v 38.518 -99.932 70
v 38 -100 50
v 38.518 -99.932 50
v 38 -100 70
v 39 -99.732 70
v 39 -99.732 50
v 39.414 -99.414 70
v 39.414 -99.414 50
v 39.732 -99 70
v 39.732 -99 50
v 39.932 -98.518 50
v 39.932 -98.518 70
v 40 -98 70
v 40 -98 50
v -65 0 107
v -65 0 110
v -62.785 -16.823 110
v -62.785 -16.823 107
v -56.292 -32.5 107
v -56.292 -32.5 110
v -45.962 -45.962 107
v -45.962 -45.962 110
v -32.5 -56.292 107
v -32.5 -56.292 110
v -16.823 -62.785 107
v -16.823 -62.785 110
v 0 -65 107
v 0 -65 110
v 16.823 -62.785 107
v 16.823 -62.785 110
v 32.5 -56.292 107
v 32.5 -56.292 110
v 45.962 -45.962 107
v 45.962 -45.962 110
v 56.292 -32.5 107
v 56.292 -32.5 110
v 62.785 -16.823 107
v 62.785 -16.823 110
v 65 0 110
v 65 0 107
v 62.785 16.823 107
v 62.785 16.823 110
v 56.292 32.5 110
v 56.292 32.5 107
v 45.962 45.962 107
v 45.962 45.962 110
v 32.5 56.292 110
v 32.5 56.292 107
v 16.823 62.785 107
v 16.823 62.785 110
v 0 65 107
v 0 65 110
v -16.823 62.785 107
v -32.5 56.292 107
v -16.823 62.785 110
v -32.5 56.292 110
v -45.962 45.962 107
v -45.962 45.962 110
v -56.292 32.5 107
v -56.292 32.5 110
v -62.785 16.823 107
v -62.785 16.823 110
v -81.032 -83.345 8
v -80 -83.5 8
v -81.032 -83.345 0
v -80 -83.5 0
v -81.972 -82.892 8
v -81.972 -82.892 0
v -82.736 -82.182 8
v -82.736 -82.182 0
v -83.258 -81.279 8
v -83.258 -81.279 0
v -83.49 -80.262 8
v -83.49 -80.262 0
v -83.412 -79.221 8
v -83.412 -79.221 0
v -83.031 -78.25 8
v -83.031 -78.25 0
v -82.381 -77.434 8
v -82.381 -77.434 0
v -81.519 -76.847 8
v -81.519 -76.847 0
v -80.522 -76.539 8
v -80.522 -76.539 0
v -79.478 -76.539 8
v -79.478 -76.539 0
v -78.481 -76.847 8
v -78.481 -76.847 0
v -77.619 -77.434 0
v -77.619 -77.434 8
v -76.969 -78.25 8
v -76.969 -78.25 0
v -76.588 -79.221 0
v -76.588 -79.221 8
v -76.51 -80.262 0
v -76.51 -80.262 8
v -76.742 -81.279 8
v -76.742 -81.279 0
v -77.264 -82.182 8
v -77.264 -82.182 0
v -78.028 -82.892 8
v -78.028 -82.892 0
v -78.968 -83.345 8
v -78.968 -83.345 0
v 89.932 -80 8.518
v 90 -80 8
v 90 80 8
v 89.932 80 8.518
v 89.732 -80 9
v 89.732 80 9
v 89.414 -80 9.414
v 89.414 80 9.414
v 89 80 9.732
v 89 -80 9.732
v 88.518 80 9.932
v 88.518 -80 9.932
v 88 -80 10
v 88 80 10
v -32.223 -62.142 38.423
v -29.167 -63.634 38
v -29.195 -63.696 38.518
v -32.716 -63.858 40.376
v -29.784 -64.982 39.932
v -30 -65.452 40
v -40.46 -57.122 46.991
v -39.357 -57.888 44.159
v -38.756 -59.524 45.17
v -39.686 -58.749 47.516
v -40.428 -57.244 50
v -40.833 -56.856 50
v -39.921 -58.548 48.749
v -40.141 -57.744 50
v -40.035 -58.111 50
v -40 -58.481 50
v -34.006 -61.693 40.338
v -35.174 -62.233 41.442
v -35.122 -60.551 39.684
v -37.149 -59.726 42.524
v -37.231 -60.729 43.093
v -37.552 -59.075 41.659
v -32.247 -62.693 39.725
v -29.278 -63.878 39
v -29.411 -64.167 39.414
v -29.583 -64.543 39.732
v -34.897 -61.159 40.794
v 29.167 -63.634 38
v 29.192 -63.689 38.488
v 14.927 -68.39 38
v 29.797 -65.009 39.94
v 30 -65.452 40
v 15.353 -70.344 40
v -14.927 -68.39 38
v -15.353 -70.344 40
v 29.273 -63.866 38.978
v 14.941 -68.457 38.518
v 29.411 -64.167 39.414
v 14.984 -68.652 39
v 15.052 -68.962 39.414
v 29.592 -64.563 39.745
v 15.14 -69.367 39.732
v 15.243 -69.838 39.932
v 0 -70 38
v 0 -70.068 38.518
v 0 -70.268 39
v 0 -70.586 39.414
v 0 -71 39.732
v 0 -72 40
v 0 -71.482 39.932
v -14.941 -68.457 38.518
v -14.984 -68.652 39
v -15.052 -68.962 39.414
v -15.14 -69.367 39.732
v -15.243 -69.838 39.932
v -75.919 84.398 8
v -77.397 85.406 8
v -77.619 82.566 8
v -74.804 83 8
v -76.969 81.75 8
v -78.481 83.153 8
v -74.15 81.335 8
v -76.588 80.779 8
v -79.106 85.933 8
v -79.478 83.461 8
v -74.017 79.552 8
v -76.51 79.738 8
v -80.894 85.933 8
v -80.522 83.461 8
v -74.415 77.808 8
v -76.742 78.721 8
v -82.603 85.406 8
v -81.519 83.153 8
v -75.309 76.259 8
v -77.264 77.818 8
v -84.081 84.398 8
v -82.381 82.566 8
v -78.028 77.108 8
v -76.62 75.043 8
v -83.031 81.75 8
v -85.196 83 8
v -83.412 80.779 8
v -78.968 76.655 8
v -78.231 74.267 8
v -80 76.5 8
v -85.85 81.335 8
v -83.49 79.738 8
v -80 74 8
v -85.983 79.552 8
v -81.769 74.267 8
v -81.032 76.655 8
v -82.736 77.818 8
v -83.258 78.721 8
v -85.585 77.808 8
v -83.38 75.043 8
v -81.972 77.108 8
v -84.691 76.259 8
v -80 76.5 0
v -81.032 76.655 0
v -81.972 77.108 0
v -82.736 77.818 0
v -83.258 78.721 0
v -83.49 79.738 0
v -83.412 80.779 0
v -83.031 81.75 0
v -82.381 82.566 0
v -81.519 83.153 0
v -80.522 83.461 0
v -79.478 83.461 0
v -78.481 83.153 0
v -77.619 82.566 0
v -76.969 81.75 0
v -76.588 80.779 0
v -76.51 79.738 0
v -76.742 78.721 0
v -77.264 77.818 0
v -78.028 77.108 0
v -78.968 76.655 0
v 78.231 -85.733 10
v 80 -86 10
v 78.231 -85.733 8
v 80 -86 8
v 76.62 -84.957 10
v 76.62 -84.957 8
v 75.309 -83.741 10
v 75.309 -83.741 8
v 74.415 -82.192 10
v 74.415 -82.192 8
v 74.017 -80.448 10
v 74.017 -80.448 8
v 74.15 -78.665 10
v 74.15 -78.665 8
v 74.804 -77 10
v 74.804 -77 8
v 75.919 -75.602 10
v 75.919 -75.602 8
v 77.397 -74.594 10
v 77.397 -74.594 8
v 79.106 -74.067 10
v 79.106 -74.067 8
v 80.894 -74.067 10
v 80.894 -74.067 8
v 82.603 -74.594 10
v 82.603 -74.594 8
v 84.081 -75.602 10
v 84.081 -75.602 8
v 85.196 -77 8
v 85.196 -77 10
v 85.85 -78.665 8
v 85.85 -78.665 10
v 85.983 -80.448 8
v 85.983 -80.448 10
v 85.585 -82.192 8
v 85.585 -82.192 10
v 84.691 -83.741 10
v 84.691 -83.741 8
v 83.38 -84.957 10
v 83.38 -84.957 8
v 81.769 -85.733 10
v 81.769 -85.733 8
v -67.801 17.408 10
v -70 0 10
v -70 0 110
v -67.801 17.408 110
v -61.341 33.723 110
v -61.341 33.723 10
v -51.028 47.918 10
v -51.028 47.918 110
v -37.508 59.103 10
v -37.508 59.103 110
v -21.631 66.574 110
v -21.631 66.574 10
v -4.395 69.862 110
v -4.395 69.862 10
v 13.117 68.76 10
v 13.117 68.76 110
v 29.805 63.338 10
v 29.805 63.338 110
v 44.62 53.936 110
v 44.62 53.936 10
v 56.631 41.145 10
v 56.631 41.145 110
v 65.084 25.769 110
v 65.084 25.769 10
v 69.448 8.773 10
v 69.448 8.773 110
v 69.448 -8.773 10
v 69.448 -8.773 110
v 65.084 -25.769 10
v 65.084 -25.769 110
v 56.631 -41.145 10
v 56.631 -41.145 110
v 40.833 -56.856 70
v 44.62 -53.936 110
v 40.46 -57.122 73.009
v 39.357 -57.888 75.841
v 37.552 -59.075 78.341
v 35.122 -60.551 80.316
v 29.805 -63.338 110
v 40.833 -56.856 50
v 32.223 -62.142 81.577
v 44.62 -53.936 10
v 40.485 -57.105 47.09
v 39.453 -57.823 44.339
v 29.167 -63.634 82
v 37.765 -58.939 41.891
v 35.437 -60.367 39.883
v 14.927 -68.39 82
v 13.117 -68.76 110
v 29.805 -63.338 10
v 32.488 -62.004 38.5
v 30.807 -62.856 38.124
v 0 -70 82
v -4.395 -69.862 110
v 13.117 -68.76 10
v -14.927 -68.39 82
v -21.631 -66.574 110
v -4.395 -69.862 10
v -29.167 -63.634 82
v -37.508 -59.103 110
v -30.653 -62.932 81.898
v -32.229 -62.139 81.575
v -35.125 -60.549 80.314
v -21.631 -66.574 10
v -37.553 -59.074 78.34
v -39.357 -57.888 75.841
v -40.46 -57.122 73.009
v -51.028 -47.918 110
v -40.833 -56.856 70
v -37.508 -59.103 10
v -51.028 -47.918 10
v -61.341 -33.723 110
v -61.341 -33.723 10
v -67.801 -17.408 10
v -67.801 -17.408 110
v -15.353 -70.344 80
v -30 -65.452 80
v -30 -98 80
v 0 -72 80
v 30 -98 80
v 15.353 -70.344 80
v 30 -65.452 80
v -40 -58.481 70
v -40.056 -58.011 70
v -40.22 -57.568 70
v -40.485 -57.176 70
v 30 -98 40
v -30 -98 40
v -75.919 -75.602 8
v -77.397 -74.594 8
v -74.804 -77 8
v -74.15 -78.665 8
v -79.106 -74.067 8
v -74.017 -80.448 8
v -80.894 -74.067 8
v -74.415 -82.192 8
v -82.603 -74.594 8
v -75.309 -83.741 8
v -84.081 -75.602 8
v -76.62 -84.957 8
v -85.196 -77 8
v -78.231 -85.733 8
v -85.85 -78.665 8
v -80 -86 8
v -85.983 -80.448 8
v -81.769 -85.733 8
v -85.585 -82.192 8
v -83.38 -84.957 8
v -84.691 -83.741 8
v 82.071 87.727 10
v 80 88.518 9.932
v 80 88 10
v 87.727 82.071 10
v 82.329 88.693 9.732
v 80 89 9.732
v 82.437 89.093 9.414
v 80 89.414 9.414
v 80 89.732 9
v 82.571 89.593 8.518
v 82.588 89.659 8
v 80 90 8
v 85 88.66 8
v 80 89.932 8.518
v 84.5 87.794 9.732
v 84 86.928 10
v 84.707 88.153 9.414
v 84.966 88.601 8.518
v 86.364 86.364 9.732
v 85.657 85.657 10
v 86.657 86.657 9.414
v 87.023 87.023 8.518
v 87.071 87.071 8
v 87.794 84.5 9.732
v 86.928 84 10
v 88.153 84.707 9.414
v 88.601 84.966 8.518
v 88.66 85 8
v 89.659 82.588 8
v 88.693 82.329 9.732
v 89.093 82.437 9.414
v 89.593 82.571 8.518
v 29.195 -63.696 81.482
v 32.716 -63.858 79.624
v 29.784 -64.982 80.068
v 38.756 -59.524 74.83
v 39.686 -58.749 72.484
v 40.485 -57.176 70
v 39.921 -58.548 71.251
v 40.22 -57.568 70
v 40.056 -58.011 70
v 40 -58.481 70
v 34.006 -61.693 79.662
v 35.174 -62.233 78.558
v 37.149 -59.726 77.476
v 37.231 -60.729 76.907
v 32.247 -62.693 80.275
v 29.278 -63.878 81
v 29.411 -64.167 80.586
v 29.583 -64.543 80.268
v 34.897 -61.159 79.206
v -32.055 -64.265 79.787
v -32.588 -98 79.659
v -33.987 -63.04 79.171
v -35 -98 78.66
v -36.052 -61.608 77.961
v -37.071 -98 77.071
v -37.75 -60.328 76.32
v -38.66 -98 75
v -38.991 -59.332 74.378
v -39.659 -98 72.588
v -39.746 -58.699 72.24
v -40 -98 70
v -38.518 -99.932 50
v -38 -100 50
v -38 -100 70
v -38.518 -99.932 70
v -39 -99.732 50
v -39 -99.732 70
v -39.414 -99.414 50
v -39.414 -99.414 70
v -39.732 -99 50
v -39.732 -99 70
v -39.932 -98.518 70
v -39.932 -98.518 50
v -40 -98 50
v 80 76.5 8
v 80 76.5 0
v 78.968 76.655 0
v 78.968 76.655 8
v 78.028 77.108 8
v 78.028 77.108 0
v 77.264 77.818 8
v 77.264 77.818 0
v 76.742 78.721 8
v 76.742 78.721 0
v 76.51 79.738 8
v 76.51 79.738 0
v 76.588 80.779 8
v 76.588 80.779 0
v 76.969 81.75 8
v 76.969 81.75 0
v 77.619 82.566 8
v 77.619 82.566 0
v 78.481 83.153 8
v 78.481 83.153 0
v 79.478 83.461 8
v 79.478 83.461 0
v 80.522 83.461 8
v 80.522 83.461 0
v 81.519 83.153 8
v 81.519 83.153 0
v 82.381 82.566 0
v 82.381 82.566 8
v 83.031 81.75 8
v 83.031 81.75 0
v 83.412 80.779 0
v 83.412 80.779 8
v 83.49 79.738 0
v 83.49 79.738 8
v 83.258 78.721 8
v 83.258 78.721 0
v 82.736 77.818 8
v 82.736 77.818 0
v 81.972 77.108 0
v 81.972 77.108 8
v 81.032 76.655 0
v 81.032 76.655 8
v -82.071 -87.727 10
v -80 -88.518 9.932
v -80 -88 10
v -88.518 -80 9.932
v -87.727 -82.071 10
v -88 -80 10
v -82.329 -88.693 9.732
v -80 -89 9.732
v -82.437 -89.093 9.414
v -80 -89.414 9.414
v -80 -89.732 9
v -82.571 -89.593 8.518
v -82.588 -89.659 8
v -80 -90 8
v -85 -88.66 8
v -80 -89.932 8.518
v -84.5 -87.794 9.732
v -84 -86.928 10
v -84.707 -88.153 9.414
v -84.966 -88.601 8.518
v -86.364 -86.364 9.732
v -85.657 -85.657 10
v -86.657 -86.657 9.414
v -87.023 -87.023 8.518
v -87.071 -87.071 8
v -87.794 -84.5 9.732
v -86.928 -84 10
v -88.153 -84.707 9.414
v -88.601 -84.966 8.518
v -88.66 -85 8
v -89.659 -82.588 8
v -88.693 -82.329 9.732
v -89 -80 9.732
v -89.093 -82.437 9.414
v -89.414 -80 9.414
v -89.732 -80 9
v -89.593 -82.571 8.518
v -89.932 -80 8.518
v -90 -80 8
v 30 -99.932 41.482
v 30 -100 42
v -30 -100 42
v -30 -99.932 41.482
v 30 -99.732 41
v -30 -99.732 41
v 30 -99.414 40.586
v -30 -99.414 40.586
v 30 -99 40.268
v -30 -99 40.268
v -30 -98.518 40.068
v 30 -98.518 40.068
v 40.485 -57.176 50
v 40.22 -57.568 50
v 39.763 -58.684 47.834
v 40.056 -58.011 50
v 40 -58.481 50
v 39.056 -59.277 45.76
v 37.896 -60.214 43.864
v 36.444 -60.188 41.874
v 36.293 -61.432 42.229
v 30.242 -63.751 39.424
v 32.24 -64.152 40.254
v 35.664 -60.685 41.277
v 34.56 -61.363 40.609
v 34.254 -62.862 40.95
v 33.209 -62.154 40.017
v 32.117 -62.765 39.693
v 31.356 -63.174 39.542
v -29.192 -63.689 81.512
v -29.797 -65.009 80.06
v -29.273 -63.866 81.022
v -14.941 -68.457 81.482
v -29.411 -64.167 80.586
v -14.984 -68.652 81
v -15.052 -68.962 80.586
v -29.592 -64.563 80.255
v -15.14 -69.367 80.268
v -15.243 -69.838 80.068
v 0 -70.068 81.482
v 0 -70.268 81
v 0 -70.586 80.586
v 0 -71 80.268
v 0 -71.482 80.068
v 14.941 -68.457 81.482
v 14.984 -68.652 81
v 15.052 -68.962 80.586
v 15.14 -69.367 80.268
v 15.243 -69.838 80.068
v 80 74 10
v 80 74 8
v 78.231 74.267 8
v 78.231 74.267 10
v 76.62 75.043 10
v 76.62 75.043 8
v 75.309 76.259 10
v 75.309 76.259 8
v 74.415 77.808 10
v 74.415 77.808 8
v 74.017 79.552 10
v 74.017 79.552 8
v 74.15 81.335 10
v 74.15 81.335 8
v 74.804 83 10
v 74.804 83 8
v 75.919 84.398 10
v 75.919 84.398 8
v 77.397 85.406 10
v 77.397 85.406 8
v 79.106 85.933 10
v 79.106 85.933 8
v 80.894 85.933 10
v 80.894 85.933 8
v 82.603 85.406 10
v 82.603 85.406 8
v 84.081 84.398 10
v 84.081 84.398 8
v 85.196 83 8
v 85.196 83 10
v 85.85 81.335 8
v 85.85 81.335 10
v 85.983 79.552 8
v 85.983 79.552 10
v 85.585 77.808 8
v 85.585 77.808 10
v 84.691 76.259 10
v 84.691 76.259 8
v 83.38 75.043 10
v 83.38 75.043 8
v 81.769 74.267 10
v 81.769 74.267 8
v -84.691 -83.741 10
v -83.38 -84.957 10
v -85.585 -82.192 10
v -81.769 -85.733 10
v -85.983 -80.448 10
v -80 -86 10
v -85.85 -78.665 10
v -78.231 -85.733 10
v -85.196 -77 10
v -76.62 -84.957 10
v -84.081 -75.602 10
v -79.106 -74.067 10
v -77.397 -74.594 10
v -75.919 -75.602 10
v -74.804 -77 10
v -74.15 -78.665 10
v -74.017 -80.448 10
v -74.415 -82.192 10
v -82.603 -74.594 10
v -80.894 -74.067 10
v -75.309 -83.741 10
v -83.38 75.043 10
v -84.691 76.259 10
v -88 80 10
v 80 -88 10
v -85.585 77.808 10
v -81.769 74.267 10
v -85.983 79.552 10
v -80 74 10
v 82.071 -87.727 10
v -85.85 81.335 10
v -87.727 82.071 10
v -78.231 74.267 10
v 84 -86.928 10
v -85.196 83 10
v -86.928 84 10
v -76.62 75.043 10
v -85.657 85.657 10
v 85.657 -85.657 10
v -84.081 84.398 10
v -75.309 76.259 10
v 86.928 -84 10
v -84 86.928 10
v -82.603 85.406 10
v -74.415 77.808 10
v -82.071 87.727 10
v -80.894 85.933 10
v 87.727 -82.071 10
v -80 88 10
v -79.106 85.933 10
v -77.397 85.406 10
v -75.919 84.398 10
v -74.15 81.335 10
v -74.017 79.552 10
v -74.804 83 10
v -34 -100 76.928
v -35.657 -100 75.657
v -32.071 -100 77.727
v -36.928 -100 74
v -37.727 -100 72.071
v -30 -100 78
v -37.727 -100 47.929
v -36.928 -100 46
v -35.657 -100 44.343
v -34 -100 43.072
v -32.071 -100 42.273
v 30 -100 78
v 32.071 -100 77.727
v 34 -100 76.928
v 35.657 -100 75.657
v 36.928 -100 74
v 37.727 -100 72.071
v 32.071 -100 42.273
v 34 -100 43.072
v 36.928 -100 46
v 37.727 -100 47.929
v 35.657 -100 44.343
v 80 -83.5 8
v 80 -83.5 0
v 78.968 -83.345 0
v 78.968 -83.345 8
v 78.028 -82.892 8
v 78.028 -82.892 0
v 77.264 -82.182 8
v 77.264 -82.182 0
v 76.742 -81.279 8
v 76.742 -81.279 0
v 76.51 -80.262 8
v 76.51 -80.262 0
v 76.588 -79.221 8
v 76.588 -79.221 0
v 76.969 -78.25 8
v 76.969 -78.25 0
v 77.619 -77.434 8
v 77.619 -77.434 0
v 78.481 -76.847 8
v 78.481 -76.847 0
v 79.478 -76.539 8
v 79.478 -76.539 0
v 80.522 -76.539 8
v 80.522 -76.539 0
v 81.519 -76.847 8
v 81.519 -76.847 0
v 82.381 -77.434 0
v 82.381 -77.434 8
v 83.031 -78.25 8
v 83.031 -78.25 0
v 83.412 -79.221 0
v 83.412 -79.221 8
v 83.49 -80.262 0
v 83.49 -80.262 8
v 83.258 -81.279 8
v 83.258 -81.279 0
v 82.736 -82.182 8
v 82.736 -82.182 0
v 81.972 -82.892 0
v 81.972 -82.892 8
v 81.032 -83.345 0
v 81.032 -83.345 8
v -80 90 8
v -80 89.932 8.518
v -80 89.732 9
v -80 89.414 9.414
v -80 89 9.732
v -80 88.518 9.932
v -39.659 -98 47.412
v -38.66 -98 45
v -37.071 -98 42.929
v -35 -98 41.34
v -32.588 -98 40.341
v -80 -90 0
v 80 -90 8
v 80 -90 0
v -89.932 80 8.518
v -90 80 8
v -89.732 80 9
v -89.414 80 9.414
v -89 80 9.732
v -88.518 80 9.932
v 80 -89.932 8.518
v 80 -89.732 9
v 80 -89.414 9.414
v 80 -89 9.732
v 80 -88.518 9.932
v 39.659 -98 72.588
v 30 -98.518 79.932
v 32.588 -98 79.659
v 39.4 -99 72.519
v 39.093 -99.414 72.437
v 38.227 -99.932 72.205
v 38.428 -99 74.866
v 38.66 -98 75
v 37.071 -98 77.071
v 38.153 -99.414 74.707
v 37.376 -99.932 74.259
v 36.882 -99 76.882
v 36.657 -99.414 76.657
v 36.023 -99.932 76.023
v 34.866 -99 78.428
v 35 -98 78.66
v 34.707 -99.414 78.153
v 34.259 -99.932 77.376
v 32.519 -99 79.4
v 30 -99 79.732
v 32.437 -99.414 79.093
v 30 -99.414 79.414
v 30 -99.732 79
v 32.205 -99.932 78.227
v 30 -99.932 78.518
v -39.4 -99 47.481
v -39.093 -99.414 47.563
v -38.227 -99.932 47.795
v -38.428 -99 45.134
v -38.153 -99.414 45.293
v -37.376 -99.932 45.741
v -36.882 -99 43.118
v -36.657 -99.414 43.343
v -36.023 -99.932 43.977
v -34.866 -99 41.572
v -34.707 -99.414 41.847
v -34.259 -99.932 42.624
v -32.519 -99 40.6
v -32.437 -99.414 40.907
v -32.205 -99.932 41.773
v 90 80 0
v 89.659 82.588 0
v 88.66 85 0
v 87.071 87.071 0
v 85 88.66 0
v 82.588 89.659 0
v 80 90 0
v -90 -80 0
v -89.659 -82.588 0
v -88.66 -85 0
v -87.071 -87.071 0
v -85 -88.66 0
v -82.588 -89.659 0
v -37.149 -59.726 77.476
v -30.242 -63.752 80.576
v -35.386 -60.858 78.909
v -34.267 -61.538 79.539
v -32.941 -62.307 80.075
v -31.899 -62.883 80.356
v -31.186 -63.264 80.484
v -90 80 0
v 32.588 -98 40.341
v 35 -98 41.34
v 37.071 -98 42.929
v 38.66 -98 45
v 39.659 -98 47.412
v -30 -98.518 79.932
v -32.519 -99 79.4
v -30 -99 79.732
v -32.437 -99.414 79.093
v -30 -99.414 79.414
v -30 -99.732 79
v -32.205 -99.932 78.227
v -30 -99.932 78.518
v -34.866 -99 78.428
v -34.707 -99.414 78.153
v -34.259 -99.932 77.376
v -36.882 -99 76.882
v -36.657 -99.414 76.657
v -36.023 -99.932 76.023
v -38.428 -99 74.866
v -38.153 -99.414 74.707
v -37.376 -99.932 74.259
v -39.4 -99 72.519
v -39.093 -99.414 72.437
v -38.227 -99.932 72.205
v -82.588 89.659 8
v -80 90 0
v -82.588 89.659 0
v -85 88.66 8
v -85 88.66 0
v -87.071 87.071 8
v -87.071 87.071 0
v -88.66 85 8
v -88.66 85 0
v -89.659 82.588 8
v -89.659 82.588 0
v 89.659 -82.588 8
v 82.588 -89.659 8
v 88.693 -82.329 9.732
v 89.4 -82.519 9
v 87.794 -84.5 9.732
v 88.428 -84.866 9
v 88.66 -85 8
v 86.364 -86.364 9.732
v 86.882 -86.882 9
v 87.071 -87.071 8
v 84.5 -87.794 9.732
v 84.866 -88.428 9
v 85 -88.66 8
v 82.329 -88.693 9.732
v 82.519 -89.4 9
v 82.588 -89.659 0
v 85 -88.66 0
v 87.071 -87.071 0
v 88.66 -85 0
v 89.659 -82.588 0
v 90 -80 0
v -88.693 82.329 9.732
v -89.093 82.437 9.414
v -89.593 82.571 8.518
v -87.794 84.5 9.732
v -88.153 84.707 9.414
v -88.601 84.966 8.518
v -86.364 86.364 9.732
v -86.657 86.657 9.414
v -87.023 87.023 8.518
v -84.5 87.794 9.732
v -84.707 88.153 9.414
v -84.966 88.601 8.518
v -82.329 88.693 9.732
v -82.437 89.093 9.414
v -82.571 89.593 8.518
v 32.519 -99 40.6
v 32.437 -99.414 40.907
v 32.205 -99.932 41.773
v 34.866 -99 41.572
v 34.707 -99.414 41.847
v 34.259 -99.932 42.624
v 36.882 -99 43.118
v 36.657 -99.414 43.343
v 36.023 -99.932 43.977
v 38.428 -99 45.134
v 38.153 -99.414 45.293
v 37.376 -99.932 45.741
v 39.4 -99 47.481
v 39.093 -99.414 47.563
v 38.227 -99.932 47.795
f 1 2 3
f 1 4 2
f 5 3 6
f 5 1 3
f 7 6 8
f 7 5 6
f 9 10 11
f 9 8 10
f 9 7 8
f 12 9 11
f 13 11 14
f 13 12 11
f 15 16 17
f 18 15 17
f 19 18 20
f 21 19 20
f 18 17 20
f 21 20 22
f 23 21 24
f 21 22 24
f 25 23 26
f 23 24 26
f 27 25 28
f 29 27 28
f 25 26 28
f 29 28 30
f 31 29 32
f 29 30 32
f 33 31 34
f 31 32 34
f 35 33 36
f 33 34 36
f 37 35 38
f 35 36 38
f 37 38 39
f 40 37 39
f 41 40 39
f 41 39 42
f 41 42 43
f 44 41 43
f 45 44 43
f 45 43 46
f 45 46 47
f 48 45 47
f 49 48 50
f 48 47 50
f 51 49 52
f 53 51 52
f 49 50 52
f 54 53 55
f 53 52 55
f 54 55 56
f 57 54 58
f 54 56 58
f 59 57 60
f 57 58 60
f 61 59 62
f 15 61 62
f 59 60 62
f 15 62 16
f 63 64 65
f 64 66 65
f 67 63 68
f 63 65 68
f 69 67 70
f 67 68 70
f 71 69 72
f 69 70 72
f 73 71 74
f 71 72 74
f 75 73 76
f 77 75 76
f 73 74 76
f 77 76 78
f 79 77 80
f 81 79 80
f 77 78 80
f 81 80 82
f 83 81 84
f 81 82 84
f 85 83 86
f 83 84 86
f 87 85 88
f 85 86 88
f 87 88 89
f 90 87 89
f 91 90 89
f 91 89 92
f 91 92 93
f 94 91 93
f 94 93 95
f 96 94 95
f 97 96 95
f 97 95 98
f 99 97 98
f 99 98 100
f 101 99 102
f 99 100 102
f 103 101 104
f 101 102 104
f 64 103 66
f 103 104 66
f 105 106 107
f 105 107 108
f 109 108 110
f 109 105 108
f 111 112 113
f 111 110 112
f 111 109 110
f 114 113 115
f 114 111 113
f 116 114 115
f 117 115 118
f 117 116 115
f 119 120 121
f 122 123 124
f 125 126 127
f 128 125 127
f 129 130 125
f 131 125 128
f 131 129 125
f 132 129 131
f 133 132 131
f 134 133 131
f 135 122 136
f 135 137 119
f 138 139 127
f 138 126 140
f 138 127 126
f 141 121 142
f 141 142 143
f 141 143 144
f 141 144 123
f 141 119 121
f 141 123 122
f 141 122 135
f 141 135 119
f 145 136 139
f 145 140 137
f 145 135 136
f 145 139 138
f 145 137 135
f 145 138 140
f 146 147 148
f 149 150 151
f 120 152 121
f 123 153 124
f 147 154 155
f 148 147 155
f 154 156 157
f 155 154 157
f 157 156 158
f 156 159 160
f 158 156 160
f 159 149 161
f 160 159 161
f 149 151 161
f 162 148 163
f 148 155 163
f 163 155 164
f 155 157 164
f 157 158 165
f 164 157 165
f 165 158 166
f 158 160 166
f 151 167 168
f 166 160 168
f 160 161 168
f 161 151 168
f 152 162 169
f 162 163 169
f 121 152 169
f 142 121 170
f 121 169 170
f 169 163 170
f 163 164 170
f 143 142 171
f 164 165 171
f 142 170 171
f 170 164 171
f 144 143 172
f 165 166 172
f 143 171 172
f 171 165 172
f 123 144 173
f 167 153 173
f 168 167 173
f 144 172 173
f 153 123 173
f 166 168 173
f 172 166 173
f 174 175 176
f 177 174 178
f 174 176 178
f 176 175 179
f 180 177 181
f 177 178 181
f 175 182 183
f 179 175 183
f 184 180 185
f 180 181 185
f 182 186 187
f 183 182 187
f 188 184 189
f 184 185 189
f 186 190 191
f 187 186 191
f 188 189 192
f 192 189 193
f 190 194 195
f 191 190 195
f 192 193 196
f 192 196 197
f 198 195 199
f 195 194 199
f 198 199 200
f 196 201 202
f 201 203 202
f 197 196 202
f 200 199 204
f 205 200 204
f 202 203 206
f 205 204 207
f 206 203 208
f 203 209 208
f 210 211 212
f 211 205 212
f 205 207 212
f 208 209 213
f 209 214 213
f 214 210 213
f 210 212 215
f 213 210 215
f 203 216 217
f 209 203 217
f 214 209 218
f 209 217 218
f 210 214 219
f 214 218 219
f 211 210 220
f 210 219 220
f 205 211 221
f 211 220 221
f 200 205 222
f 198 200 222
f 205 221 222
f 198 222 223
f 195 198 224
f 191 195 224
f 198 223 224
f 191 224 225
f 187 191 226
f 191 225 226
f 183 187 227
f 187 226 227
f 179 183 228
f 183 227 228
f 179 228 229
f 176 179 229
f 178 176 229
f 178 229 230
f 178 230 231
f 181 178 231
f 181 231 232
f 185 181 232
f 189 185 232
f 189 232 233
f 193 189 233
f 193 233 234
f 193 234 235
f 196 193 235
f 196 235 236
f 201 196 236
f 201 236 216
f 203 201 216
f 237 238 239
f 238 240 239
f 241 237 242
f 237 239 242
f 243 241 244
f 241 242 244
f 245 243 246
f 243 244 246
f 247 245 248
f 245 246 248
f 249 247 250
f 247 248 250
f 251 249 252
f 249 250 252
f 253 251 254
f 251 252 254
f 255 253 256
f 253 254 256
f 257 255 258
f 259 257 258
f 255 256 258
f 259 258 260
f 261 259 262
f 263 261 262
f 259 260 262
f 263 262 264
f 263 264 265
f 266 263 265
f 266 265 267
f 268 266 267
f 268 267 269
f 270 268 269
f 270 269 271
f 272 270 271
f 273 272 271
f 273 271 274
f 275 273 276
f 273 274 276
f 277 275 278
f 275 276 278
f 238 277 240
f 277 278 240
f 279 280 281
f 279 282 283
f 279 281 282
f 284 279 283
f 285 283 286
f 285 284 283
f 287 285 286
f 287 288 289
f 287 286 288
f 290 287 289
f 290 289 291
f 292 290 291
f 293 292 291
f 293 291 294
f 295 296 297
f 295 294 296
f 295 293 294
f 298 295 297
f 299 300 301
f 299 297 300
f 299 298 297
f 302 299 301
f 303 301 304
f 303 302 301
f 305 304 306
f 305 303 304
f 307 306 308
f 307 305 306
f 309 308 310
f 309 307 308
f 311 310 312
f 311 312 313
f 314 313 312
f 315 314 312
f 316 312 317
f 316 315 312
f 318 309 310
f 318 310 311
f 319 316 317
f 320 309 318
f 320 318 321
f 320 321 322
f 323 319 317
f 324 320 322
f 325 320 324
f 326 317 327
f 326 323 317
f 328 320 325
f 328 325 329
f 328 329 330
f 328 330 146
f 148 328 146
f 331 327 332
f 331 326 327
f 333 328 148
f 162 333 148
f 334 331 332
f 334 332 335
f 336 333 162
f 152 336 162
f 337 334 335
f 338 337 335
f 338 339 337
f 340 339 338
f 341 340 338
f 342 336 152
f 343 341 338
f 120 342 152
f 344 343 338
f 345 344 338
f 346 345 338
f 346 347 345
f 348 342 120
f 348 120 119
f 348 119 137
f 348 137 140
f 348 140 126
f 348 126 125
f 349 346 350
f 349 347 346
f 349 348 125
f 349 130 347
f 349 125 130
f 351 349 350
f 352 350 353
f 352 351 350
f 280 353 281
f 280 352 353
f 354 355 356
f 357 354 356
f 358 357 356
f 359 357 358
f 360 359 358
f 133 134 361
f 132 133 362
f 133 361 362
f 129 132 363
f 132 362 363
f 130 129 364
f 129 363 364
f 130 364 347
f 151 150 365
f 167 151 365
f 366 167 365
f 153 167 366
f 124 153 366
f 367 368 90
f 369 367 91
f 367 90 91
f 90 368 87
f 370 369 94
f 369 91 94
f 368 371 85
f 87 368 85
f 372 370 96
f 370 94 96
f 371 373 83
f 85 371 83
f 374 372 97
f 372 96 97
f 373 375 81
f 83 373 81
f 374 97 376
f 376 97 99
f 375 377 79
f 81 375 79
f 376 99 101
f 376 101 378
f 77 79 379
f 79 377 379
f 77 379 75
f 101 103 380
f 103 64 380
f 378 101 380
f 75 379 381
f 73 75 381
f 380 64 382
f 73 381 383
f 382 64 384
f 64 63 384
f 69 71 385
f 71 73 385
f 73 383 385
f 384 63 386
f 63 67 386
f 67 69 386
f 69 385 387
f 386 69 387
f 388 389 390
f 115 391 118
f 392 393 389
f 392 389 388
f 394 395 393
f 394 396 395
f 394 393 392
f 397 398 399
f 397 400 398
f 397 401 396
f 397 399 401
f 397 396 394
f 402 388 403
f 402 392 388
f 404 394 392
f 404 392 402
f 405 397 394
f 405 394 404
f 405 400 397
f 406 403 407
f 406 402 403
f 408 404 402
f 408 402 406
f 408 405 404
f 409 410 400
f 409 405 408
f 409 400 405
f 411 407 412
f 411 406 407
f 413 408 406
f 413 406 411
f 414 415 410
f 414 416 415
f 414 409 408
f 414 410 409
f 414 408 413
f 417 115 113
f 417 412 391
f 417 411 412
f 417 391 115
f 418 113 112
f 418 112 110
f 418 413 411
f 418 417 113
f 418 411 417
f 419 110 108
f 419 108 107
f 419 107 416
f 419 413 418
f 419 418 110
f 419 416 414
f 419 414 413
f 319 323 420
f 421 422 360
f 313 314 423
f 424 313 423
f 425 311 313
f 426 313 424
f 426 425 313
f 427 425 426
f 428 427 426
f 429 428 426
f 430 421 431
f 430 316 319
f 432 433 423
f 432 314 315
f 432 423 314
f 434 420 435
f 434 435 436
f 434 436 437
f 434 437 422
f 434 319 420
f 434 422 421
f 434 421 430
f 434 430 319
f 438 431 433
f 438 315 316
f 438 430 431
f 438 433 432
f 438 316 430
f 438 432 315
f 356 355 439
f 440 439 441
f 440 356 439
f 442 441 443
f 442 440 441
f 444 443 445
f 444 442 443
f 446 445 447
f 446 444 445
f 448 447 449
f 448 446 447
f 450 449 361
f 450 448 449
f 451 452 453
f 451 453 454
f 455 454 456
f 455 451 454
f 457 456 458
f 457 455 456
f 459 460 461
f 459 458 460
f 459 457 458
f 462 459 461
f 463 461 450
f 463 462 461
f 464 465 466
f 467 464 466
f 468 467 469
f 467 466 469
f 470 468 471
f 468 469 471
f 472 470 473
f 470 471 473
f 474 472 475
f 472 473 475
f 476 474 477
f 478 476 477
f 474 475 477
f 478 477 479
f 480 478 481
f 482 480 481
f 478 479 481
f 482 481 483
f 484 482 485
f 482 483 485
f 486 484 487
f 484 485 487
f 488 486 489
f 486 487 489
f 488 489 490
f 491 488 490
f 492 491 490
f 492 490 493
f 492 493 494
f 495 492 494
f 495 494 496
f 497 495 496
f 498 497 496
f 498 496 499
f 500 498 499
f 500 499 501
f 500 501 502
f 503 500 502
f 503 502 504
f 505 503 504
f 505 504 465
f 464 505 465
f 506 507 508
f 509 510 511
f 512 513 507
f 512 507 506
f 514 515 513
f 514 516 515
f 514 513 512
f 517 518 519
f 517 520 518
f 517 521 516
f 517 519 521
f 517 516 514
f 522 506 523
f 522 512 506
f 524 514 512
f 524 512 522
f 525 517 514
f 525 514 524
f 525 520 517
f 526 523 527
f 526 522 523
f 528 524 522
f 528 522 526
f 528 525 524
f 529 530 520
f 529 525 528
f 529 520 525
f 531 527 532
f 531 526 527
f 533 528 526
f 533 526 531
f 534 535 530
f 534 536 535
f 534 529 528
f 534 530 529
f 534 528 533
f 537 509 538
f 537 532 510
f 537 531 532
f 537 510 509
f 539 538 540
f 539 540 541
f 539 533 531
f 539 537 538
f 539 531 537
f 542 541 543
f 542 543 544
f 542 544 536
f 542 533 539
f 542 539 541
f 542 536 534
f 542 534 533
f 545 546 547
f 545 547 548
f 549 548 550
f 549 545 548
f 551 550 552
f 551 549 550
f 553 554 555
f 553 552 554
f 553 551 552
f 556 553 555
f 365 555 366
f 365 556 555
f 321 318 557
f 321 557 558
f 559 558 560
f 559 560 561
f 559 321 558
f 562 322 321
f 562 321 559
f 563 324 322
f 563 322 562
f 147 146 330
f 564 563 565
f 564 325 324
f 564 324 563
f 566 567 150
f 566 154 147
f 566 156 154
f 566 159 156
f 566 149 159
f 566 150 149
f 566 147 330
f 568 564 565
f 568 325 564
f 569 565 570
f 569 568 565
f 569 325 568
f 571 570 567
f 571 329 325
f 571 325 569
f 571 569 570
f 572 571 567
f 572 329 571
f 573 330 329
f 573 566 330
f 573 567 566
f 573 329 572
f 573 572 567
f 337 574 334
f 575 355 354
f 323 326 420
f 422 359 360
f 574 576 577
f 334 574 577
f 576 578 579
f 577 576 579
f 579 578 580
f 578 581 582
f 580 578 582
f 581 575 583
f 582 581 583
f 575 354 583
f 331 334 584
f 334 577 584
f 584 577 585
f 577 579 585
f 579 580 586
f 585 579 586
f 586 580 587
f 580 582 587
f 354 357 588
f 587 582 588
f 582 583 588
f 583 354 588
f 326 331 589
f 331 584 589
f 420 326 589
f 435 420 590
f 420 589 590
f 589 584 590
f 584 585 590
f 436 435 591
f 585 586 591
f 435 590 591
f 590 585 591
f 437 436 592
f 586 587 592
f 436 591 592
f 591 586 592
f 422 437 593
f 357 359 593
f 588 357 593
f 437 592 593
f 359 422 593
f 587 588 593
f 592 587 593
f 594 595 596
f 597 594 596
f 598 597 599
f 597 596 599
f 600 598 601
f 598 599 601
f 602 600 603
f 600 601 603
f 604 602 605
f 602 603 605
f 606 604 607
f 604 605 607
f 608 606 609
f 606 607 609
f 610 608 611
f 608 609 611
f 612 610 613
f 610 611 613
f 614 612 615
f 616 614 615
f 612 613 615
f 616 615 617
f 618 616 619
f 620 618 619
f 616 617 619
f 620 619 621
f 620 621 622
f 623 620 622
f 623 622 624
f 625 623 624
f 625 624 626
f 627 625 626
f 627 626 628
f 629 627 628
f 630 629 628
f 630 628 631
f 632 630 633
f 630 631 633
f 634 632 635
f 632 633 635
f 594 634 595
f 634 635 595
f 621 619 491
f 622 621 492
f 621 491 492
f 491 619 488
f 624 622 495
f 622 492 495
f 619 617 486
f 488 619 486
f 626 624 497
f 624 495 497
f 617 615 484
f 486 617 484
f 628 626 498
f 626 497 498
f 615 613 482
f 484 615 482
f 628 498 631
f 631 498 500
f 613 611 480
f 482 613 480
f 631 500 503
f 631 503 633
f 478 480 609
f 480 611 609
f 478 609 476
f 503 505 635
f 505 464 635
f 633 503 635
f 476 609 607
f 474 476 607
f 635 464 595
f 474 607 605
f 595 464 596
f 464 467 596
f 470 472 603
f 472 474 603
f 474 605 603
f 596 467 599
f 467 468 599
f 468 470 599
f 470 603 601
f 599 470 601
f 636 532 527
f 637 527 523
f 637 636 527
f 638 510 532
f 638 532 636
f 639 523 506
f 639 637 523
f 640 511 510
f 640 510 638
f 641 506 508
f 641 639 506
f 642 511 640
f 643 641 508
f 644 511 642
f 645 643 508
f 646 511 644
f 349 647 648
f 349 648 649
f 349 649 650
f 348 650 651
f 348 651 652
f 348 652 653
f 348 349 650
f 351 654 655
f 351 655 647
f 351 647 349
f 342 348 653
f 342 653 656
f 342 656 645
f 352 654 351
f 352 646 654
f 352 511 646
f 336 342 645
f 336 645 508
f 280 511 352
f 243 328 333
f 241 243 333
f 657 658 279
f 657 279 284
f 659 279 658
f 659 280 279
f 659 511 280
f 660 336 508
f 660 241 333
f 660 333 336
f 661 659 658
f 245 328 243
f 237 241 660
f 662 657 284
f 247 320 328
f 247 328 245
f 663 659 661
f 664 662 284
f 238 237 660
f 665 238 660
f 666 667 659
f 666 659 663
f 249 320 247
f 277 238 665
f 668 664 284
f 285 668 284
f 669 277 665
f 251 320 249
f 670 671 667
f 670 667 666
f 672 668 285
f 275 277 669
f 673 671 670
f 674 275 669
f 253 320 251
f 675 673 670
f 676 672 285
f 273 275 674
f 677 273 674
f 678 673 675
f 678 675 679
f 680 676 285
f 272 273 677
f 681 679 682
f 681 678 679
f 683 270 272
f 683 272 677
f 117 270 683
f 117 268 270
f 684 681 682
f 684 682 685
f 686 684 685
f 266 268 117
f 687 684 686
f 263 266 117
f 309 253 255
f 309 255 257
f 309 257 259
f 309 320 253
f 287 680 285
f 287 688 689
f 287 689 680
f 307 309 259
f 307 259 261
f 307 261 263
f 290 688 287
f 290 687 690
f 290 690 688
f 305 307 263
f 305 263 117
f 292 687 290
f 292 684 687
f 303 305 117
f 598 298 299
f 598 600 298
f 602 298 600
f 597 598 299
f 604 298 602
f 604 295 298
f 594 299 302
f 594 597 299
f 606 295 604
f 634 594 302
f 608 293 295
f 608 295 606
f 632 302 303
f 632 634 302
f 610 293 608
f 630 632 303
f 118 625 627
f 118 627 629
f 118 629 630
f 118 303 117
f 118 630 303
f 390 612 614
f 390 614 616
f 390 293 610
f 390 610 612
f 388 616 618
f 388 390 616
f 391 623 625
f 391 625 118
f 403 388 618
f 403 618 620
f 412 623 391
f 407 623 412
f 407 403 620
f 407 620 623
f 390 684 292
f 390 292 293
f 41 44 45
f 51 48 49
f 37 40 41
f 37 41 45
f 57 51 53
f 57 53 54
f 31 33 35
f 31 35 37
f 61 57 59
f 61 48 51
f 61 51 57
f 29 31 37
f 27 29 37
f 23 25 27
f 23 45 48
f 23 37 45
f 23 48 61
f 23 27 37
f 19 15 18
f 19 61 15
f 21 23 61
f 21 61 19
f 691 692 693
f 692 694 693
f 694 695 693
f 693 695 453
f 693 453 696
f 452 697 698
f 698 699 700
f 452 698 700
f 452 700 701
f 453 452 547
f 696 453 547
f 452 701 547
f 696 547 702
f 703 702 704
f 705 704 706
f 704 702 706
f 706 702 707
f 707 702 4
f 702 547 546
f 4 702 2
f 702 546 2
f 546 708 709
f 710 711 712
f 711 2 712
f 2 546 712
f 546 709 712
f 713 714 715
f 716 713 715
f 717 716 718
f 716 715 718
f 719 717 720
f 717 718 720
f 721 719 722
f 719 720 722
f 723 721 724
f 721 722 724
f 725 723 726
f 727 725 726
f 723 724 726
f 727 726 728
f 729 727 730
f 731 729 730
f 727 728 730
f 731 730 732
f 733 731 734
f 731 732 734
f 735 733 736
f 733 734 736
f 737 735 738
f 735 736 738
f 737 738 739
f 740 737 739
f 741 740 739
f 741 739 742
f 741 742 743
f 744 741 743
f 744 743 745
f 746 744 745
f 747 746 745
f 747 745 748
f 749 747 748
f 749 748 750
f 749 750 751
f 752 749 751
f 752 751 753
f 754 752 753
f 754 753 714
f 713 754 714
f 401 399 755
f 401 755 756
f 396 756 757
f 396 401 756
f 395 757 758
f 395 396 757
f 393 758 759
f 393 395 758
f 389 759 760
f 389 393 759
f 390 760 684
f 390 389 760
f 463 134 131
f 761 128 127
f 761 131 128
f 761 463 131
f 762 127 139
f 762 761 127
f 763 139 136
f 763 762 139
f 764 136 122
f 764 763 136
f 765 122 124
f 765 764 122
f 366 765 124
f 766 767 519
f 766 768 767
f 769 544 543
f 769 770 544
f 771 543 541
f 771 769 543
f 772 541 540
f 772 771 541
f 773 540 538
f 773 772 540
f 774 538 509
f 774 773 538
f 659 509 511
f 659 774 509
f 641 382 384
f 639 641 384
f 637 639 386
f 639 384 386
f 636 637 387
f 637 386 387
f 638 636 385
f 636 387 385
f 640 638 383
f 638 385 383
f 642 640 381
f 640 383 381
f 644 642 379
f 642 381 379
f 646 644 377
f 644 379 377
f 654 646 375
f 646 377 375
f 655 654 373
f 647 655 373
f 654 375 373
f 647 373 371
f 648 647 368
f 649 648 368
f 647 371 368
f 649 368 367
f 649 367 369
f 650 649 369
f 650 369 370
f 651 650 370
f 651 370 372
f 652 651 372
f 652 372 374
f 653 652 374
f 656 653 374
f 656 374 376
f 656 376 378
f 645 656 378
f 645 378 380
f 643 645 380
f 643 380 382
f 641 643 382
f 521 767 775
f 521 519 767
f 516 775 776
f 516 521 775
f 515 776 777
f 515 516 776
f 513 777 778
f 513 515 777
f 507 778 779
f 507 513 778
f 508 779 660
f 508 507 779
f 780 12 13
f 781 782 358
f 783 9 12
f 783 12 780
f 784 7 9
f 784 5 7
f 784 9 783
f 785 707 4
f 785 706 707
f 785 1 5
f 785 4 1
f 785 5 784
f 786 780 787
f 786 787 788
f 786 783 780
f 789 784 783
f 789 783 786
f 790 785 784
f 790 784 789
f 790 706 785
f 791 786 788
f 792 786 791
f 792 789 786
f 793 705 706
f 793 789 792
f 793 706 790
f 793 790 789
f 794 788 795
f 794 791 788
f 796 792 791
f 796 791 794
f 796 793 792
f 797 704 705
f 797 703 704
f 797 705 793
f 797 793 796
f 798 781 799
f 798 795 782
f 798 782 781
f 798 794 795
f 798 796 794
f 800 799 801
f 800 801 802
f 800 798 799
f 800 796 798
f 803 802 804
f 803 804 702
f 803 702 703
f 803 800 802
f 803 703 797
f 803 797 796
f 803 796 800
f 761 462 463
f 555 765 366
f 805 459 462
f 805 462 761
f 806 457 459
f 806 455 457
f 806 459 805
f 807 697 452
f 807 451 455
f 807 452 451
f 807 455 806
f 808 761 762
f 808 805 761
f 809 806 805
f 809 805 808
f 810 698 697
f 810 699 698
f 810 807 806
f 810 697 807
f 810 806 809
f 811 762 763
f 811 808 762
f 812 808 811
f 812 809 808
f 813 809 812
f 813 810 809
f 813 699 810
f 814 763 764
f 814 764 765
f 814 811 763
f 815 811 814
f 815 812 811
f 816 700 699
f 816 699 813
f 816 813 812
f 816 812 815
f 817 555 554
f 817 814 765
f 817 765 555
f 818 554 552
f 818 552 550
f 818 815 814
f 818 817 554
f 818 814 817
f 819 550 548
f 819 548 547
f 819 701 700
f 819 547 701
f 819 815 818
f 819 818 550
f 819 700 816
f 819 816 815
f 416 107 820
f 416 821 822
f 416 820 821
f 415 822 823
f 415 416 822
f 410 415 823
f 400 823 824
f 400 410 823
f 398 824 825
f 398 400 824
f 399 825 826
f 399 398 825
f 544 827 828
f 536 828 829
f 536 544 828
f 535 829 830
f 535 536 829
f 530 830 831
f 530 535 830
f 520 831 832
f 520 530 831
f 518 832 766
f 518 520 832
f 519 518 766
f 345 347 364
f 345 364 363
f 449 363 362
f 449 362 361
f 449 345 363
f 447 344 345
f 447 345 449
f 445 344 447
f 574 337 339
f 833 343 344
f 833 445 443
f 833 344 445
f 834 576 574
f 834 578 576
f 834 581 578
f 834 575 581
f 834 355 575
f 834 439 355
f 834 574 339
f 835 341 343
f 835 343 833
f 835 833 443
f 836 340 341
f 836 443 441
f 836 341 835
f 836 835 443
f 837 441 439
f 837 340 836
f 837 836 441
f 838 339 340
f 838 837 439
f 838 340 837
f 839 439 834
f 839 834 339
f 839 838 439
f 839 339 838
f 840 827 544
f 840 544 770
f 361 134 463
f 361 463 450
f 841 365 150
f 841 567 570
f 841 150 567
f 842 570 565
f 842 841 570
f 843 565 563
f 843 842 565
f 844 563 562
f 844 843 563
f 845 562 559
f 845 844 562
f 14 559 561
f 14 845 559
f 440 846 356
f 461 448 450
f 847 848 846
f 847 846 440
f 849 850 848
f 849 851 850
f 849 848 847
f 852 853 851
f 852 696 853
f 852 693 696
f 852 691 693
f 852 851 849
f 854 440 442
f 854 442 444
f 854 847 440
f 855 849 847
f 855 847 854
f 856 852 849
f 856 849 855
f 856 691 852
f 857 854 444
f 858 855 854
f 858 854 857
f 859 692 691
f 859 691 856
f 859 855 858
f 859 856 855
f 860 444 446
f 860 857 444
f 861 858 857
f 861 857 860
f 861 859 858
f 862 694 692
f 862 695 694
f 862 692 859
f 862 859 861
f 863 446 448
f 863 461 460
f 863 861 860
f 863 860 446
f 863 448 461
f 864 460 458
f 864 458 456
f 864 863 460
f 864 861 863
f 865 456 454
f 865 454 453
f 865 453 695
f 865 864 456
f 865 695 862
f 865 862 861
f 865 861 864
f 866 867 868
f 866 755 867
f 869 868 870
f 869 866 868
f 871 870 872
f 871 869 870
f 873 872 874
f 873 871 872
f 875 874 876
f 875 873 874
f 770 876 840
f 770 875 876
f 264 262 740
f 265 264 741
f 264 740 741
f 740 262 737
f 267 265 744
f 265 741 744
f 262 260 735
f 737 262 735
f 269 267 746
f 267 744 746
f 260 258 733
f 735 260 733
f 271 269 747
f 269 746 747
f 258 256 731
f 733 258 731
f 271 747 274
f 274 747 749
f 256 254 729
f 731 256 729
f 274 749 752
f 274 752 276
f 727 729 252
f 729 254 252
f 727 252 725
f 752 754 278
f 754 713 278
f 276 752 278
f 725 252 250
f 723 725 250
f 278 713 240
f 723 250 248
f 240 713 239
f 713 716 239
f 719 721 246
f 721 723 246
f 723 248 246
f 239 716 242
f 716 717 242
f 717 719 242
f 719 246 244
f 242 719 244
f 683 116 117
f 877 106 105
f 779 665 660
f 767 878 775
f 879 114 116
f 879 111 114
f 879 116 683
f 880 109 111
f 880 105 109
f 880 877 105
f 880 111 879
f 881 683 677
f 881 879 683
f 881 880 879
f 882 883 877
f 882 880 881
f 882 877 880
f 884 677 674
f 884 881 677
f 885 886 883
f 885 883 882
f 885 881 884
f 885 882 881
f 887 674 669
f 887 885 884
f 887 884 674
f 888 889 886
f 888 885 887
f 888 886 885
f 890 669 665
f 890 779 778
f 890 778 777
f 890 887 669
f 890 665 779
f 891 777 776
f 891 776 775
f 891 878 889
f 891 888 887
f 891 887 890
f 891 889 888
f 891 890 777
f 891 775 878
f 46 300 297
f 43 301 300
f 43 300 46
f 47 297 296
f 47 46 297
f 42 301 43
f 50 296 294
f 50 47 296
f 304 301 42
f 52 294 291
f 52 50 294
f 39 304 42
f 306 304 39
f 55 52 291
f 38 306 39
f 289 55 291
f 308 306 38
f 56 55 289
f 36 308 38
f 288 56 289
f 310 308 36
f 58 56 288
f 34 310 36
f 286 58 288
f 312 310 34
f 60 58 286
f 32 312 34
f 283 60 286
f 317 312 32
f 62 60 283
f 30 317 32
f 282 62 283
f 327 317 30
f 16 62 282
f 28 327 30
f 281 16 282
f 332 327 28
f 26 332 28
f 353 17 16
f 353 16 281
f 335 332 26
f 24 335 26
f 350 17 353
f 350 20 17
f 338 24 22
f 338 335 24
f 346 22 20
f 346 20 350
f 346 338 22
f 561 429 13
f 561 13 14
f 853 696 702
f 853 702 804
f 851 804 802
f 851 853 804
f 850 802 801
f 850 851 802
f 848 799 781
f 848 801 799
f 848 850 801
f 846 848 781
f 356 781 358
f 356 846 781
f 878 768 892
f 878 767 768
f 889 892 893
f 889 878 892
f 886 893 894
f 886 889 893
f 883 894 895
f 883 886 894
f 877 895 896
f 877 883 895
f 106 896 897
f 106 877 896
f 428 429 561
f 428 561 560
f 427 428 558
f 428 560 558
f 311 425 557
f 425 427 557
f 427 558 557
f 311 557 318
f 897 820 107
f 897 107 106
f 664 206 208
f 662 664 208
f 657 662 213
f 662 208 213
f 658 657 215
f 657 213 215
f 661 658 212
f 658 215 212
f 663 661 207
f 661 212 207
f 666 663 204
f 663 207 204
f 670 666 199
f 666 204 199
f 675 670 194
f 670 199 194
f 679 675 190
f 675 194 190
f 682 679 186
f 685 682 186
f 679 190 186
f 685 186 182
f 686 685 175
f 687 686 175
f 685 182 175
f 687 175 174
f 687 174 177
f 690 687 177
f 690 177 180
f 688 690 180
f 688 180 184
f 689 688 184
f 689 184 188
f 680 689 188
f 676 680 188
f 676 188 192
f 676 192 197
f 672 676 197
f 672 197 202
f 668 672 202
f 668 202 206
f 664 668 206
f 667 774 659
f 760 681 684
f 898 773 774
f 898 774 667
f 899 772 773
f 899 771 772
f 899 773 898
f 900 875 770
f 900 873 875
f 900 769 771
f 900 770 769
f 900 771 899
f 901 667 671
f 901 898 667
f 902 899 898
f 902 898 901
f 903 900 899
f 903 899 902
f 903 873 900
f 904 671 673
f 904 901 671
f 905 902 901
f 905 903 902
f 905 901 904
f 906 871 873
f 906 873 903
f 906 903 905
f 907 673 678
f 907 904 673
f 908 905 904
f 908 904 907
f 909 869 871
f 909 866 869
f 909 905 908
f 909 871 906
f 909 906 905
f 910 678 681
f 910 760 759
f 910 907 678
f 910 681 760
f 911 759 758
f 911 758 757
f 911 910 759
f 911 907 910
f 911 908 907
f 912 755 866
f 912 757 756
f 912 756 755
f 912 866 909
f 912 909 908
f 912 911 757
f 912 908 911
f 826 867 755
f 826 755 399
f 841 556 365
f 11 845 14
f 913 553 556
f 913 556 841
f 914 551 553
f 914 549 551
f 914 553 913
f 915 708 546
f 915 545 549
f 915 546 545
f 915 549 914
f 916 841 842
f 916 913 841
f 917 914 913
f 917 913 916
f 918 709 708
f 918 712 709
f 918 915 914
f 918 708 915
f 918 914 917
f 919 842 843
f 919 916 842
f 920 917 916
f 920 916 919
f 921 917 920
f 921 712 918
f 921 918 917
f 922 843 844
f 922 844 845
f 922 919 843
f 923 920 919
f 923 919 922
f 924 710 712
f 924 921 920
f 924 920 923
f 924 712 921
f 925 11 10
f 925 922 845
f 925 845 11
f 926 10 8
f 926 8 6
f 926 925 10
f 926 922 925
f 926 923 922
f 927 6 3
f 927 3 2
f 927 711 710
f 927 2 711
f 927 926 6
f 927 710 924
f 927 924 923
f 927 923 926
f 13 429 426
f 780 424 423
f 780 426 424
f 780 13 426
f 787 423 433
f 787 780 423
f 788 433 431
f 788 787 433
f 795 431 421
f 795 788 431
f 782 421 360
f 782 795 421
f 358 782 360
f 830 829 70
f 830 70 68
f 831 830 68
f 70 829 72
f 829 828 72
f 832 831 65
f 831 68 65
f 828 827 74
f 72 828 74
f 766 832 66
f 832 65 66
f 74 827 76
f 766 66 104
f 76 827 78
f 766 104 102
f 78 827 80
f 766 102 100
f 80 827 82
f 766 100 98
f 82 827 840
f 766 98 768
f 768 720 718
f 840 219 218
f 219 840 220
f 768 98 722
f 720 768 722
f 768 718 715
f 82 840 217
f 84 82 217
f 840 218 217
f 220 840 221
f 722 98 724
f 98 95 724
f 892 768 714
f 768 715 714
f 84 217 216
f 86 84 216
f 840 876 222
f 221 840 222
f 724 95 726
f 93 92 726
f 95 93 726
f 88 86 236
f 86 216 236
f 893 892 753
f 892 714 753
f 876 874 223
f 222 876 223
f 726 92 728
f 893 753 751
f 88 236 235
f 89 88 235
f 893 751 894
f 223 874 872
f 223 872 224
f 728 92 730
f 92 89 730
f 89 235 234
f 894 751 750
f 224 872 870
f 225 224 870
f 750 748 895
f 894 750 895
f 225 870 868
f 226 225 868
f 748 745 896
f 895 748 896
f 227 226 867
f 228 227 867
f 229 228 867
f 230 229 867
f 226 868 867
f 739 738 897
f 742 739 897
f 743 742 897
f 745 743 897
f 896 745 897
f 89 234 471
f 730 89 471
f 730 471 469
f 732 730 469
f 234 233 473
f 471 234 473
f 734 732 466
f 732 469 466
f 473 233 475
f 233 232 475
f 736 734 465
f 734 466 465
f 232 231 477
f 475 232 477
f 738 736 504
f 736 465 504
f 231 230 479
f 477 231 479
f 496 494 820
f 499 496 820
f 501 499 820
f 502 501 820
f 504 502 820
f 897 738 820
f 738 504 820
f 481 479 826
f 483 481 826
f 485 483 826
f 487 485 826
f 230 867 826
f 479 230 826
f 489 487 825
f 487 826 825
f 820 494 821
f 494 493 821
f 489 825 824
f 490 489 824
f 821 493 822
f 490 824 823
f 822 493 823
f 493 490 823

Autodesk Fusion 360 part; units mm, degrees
sketch "Sketch1" plane through (0, 0, 0) normal (0, 0, 1) x (1, 0, 0)
  line L0 (-90, 90) -> (90, 90)
  line L1 (90, 90) -> (90, -90)
  line L2 (90, -90) -> (-90, -90)
  line L3 (-90, -90) -> (-90, 90)
  line L4 (-90, 90) -> (90, -90) construction
  line L5 (90, 90) -> (-90, -90) construction
  dimension "d1" = 180
  dimension "d2" = 180
extrude "Extrude1" add sketch "Sketch1" along normal blind 10
sketch "Sketch2" plane through (0, 0, 10) normal (0, 0, 1) x (-1, 0, 0)
  line L0 (90, 90) -> (-90, 90)
  line L1 (-90, 90) -> (-90, -90)
  line L2 (-90, -90) -> (90, -90)
  line L3 (90, -90) -> (90, 90)
  circle A0 centre (0, 0) radius 70
  dimension "d5" = 140
extrude "Extrude2" add sketch "Sketch2" along normal blind 100 contours A0
sketch "Sketch3" plane through (0, 0, 0) normal (0, 1, 0) x (1, 0, 0)
  line L0 (-40, -80) -> (40, -80)
  line L1 (40, -80) -> (40, -40)
  line L2 (40, -40) -> (-40, -40)
  line L3 (-40, -40) -> (-40, -80)
  line L4 (-40, -80) -> (40, -40) construction
  line L5 (40, -80) -> (-40, -40) construction
  point P0 (0, -60)
  dimension "d13" = 40
  dimension "d14" = 80
  dimension "d16" = 60
extrude "Extrude3" add sketch "Sketch3" against normal blind 100
sketch "Sketch4" plane through (0, 0, 110) normal (0, 0, 1) x (-1, 0, 0)
  circle A0 centre (0, 0) radius 70
  circle A1 centre (0, 0) radius 65
  dimension "d10" = -5
extrude "Extrude4" cut sketch "Sketch4" against normal blind 10 contours A1
extrude "Extrude5" add 1 faces at (2.3225, -16.9397, 100) along direction (0, 0, 1) blind 7
sketch "Sketch5" plane through (0, 0, 10) normal (0, 0, 1) x (-1, 0, 0)
  circle A0 centre (0, 0) radius 70
  line L0 (90, 90) -> (-90, 90)
  line L1 (-90, 90) -> (-90, -90)
  line L2 (-90, -90) -> (90, -90)
  line L3 (90, -90) -> (90, 90)
  point P0 (80, -80)
  point P1 (-80, -80)
  point P2 (-80, 80)
  point P3 (80, 80)
  point P4 (116.0582, 65.2033)
  dimension "d19" = 10
  dimension "d20" = 10
  dimension "d21" = 10
  dimension "d22" = 10
  dimension "d23" = 10
  dimension "d24" = 10
  dimension "d25" = 10
  dimension "d26" = 10
hole "Hole1" at (-80, -80, 10) at (80, -80, 10) at (80, 80, 10) at (-80, 80, 10) direction (0, 0, -1) diameter 7 depth 15 tip angle 118 counterbore diameter 12 counterbore depth 2
fillet "Fillet1" radius 10 8 edges at (-90, -90, 5) (90, -90, 5) (90, 90, 5) (-90, 90, 5) (40, -78.7228, 80) (40, -78.7228, 40) (-40, -78.7228, 80) (-40, -78.7228, 40)
fillet "Fillet2" radius 2 24 edges at (87.0711, -87.0711, 10) (90, 0, 10) (87.0711, 87.0711, 10) (0, 90, 10) (-87.0711, 87.0711, 10) (-90, 0, 10) (-87.0711, -87.0711, 10) (0, -90, 10) (-37.0711, -100, 77.0711) (-40, -100, 60) (-37.0711, -100, 42.9289) (0, -100, 40) (37.0711, -100, 42.9289) (40, -100, 60) (37.0711, -100, 77.0711) (0, -100, 80) (36.9012, -59.4835, 77.2363) (40, -57.4456, 60) (36.9012, -59.4835, 42.7637) (0, -70, 40) (-36.9012, -59.4835, 42.7637) (-40, -57.4456, 60) (-36.9012, -59.4835, 77.2363) (0, -70, 80)
